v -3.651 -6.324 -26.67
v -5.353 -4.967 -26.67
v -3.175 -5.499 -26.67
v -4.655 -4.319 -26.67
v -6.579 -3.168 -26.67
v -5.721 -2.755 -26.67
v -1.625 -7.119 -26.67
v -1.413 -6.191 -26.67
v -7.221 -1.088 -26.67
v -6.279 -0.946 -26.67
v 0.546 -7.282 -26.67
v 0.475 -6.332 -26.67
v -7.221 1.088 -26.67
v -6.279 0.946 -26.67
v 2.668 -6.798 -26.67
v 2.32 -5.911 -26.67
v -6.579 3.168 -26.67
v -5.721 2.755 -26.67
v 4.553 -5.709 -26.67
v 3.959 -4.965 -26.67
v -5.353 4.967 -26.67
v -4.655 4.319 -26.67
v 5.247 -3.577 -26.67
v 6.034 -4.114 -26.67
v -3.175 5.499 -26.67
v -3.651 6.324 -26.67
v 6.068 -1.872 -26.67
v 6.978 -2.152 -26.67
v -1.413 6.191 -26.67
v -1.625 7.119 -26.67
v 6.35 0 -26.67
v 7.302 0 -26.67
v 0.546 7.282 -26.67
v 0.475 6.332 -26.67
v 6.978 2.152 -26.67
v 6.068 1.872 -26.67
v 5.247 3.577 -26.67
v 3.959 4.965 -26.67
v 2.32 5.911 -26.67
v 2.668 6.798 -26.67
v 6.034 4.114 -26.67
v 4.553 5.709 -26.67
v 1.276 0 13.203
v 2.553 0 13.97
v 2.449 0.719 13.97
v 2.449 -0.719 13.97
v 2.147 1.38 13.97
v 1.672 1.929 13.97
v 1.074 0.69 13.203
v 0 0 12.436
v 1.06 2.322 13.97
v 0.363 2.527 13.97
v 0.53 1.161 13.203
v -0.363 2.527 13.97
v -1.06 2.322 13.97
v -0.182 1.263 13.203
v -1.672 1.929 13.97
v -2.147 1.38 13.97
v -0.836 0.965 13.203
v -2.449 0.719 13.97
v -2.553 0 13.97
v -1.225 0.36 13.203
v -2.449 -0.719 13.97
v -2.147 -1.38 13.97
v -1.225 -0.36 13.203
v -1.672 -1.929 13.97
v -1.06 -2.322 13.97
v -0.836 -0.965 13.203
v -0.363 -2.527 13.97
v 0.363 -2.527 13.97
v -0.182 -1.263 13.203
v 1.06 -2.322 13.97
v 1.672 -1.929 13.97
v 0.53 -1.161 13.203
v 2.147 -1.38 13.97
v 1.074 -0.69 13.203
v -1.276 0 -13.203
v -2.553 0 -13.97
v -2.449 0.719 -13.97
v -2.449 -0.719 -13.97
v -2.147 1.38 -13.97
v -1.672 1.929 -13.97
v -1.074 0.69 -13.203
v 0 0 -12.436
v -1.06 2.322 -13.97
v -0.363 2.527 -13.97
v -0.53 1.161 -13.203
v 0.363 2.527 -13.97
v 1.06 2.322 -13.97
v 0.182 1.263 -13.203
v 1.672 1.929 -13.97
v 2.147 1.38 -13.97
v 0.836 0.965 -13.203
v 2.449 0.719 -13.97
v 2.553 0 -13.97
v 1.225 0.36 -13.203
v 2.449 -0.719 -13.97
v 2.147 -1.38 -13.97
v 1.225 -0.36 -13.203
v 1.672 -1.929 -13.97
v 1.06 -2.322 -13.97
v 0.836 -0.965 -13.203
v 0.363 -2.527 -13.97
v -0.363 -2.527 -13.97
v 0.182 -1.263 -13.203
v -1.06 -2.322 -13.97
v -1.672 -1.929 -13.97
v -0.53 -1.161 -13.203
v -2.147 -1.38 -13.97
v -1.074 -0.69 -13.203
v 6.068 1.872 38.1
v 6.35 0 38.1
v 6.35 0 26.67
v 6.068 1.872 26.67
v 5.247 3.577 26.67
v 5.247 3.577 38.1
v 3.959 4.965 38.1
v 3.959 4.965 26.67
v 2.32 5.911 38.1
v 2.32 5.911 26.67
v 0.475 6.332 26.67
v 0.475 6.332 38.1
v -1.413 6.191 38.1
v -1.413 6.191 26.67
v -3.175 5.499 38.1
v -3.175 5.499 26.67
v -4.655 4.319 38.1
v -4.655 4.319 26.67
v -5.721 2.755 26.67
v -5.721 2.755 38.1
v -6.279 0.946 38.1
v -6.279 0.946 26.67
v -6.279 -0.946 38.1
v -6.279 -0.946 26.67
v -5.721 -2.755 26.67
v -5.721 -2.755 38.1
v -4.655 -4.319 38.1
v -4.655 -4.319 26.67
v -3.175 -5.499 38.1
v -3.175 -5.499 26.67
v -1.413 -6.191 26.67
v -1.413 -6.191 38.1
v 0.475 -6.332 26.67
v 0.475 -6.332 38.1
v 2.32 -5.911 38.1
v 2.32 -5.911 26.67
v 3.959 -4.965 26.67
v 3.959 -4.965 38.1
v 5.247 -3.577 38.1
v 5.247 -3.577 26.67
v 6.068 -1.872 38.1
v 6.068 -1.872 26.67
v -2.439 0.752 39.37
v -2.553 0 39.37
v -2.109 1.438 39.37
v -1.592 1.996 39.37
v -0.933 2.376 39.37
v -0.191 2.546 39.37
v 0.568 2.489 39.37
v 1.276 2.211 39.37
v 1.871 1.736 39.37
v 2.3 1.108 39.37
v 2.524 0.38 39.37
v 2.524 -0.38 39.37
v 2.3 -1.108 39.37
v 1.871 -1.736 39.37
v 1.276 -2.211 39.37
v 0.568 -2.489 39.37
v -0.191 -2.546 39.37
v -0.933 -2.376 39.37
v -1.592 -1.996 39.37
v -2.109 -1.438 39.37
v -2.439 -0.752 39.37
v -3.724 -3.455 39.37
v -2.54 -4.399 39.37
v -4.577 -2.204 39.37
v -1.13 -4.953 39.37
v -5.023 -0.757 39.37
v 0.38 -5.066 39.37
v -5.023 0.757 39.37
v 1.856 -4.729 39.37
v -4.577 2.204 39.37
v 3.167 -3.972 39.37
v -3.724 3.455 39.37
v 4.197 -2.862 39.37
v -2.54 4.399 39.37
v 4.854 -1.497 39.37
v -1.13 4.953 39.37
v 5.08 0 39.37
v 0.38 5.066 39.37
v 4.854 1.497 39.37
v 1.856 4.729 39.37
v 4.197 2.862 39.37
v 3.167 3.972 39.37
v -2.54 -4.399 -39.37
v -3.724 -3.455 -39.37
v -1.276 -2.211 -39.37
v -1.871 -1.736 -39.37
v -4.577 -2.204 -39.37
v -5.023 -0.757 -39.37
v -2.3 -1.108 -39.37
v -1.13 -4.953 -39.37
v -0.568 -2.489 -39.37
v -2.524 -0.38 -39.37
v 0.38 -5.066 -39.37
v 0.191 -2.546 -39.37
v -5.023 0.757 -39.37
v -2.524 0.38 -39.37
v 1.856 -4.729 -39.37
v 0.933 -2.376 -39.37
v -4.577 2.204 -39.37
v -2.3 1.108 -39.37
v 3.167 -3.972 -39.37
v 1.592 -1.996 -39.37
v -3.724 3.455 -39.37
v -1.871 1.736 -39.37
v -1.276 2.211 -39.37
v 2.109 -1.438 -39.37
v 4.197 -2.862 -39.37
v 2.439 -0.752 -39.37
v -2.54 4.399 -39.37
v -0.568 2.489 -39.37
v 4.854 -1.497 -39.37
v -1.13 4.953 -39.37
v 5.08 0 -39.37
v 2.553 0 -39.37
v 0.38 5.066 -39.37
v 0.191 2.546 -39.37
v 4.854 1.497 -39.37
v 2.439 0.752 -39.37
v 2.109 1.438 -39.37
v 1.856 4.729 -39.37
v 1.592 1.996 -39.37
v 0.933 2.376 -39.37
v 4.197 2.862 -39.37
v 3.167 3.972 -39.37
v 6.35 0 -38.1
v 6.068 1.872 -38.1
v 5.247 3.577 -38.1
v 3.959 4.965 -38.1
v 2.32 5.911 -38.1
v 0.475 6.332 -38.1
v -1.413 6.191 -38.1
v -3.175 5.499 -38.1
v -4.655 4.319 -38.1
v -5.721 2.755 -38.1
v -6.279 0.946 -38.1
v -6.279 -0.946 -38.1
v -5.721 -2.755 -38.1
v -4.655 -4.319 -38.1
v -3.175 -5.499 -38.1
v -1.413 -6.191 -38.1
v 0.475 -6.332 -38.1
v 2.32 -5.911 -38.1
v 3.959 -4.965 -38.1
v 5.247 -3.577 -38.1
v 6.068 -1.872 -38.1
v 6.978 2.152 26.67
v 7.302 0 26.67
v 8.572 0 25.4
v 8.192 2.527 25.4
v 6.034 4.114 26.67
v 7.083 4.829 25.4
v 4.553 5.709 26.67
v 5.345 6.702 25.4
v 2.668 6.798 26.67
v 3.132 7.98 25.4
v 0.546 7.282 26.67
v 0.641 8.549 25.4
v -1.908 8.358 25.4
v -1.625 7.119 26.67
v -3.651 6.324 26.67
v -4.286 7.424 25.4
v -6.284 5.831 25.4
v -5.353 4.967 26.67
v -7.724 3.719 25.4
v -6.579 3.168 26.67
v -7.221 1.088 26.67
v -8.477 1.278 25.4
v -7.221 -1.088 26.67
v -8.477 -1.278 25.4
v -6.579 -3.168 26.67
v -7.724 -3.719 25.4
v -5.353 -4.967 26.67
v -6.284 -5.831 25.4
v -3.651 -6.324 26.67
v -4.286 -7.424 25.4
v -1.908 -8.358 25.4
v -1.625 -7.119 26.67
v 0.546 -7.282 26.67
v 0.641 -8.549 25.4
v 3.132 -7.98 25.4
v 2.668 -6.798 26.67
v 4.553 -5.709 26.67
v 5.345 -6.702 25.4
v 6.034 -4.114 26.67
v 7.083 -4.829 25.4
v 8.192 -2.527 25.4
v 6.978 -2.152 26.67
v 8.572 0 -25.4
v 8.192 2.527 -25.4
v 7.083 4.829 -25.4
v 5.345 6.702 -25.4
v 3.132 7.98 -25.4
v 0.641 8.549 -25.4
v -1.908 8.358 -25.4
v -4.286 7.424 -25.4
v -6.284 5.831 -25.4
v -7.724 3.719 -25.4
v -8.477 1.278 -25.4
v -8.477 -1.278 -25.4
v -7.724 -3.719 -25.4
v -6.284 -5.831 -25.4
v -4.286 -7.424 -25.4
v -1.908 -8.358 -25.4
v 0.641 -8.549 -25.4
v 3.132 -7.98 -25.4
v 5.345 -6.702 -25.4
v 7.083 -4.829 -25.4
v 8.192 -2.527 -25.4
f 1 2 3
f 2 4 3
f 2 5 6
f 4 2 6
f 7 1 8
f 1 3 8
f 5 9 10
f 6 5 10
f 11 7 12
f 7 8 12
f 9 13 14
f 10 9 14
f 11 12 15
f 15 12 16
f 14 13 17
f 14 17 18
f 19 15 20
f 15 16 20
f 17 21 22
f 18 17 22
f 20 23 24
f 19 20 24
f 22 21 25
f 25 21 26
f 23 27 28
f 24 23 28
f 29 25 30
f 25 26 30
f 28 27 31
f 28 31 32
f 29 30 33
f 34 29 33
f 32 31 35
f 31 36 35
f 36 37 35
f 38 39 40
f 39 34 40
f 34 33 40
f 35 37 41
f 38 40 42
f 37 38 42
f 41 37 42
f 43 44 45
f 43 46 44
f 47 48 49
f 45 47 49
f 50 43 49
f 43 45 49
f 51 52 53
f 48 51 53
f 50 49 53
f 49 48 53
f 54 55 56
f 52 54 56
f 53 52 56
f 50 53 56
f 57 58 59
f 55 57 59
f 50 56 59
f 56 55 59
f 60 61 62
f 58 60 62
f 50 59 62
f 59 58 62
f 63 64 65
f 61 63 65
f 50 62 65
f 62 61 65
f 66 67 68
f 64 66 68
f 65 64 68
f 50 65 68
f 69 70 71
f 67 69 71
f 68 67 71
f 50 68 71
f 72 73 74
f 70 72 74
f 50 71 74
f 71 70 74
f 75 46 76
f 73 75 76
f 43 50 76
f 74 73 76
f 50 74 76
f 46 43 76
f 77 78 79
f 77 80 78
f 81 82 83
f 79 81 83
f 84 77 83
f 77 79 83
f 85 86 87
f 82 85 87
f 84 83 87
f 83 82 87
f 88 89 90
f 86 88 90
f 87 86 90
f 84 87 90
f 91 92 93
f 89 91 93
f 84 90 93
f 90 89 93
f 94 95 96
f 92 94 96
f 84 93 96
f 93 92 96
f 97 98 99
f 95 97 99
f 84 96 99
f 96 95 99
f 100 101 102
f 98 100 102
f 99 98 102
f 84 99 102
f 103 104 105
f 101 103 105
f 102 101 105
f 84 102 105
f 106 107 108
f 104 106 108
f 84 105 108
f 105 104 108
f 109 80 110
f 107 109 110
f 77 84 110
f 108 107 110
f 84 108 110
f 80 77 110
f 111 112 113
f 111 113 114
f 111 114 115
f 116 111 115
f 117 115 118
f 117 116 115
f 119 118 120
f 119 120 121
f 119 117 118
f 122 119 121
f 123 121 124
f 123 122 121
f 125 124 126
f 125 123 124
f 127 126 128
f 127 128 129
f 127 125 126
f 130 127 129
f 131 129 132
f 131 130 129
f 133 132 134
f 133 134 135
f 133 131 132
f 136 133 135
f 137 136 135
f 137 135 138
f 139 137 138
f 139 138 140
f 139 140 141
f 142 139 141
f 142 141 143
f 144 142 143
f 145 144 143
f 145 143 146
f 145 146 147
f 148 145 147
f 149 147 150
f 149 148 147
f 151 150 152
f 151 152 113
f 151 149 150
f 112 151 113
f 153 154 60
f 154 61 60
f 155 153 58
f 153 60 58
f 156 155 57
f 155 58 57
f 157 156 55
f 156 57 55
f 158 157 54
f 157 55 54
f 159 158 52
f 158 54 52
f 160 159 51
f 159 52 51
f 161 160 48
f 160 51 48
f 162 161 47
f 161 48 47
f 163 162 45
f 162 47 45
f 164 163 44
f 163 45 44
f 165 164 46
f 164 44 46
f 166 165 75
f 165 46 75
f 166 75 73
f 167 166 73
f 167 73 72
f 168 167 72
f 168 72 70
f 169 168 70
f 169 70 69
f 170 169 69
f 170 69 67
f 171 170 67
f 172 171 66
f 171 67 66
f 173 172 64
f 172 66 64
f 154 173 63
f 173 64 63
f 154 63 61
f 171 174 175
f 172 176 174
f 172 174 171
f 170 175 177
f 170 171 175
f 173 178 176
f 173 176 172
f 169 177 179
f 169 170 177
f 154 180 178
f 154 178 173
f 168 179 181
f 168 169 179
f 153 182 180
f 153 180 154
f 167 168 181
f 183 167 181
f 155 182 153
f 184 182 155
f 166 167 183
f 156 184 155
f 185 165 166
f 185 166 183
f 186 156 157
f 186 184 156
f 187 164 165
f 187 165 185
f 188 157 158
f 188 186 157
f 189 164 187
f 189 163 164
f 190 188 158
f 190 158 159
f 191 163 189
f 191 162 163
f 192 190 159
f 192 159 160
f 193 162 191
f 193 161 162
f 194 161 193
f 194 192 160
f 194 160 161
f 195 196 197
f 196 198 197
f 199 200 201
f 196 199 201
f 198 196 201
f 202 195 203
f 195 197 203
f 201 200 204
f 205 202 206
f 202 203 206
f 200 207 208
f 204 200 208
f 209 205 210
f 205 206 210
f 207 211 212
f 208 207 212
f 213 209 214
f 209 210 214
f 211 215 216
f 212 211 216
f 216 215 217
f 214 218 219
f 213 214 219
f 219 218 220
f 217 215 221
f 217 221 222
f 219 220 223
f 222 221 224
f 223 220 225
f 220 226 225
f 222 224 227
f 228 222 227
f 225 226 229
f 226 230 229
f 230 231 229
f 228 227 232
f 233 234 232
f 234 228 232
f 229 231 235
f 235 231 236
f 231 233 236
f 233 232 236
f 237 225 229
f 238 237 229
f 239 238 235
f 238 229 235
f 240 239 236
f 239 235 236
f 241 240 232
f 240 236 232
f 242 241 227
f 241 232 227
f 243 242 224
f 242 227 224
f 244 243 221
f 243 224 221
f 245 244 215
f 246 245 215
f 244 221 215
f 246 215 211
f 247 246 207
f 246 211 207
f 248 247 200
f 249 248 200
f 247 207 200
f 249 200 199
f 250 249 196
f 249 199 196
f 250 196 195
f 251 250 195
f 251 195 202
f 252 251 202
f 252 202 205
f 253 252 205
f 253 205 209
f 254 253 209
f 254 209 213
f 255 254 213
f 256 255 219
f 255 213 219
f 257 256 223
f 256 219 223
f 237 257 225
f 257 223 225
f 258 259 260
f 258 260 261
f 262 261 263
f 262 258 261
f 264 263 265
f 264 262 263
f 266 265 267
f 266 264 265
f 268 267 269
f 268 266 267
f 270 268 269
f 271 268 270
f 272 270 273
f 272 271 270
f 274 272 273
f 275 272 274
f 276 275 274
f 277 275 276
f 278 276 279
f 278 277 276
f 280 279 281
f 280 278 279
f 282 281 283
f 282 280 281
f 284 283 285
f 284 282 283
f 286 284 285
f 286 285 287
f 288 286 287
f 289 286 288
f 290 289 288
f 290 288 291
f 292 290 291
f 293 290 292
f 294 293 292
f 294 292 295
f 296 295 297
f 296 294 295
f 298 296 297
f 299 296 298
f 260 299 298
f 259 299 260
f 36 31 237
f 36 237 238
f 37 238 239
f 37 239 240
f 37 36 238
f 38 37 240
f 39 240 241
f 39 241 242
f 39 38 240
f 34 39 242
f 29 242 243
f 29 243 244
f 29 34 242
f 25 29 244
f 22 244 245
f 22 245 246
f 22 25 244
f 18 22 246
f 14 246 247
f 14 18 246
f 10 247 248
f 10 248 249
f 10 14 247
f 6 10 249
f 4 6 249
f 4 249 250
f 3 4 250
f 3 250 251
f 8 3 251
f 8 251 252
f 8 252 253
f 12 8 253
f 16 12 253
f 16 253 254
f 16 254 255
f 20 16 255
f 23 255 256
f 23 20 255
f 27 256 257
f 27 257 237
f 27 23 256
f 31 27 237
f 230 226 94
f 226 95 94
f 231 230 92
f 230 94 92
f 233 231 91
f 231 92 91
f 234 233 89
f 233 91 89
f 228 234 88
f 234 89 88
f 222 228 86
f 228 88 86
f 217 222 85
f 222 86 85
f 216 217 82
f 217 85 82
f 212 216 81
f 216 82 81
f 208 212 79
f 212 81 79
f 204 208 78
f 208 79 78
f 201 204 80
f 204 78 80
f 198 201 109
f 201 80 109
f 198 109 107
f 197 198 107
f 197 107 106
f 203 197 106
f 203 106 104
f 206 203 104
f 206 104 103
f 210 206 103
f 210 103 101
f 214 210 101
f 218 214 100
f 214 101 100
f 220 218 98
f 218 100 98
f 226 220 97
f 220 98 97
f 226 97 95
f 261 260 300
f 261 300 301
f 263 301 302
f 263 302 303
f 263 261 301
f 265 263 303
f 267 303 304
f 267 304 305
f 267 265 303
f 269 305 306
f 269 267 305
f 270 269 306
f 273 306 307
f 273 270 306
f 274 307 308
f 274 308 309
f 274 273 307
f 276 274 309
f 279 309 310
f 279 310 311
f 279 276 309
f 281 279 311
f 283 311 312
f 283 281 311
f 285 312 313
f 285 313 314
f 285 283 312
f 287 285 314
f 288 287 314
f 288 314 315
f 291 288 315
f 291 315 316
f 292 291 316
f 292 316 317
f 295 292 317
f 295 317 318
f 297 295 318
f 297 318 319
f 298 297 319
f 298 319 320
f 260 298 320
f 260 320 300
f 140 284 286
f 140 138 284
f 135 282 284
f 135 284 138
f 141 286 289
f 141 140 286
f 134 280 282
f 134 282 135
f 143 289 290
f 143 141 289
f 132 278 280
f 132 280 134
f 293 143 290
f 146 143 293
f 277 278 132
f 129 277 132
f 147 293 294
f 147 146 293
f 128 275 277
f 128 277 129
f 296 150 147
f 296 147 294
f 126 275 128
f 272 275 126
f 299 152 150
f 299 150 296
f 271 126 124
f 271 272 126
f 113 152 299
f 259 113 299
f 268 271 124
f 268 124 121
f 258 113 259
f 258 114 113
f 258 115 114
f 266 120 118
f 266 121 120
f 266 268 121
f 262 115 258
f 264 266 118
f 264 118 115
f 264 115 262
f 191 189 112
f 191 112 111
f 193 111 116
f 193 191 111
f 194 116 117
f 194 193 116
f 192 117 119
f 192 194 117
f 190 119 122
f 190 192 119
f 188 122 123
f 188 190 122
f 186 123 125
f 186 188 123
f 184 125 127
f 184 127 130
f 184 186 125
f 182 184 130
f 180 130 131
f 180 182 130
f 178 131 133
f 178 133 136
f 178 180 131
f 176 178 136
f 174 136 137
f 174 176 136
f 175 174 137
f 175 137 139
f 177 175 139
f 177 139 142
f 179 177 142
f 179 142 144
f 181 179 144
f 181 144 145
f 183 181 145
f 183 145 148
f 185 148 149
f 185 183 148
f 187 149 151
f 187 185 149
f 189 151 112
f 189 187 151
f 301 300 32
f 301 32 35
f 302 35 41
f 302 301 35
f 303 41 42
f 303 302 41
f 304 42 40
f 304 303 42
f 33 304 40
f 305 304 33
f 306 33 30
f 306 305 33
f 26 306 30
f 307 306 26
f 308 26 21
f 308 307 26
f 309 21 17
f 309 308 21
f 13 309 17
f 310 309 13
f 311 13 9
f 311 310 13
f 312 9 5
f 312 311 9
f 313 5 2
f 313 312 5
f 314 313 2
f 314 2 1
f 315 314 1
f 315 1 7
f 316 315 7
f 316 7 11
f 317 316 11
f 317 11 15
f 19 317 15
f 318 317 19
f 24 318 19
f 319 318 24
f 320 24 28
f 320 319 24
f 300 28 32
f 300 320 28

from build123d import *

# Parameters (mm, degrees)
SKETCH1_R                   = 8.5725
SKETCH1_R_2                 = 6.35
BOSS_EXTRUDE1_DEPTH         = 26.67
SKETCH2_R                   = 6.35
BOSS_EXTRUDE2_DEPTH         = 39.37
CHAMFER1_SIZE               = 1.27
F_1_4_20_TAPPED_HOLE1_D     = 5.1054
F_1_4_20_TAPPED_HOLE1_DEPTH = 25.4
F_1_4_20_TAPPED_HOLE1_TIP   = 1.533816902
F_1_4_20_TAPPED_HOLE2_D     = 5.1054
F_1_4_20_TAPPED_HOLE2_DEPTH = 25.4
F_1_4_20_TAPPED_HOLE2_TIP   = 1.533816902


with BuildPart() as part:
    # Sketch1 → Boss-Extrude1 (new body, symmetric)
    with BuildSketch(Plane.XY):
        Circle(SKETCH1_R)
        Circle(SKETCH1_R_2, mode=Mode.SUBTRACT)
    extrude(amount=BOSS_EXTRUDE1_DEPTH, both=True)

    # Sketch2 → Boss-Extrude2 (add, symmetric)
    with BuildSketch(Plane.XY):
        Circle(SKETCH2_R)
    extrude(amount=BOSS_EXTRUDE2_DEPTH, both=True)

    # Chamfer1
    chamfer1_edges = [part.edges().sort_by_distance(p)[0] for p in [
        (-8.5725, 0, -26.67),
        (-8.5725, 0, 26.67),
        (-6.35, 0, -39.37),
        (-6.35, 0, 39.37),
    ]]
    chamfer(chamfer1_edges, length=CHAMFER1_SIZE)

    # 1/4-20 Tapped Hole1
    with Locations(Plane(origin=(0, 0, -39.37), x_dir=(-1, 0, 0), z_dir=(0, 0, -1))):
        with Locations((0, 0)):
            Hole(F_1_4_20_TAPPED_HOLE1_D / 2, depth=F_1_4_20_TAPPED_HOLE1_DEPTH)
            with Locations((0, 0, -(F_1_4_20_TAPPED_HOLE1_DEPTH + F_1_4_20_TAPPED_HOLE1_TIP / 2))):  # 118° drill point
                Cone(0, F_1_4_20_TAPPED_HOLE1_D / 2, F_1_4_20_TAPPED_HOLE1_TIP, mode=Mode.SUBTRACT)

    # 1/4-20 Tapped Hole2
    with Locations(Plane.XY.offset(39.37)):
        with Locations((0, 0)):
            Hole(F_1_4_20_TAPPED_HOLE2_D / 2, depth=F_1_4_20_TAPPED_HOLE2_DEPTH)
            with Locations((0, 0, -(F_1_4_20_TAPPED_HOLE2_DEPTH + F_1_4_20_TAPPED_HOLE2_TIP / 2))):  # 118° drill point
                Cone(0, F_1_4_20_TAPPED_HOLE2_D / 2, F_1_4_20_TAPPED_HOLE2_TIP, mode=Mode.SUBTRACT)


solid = part.part
